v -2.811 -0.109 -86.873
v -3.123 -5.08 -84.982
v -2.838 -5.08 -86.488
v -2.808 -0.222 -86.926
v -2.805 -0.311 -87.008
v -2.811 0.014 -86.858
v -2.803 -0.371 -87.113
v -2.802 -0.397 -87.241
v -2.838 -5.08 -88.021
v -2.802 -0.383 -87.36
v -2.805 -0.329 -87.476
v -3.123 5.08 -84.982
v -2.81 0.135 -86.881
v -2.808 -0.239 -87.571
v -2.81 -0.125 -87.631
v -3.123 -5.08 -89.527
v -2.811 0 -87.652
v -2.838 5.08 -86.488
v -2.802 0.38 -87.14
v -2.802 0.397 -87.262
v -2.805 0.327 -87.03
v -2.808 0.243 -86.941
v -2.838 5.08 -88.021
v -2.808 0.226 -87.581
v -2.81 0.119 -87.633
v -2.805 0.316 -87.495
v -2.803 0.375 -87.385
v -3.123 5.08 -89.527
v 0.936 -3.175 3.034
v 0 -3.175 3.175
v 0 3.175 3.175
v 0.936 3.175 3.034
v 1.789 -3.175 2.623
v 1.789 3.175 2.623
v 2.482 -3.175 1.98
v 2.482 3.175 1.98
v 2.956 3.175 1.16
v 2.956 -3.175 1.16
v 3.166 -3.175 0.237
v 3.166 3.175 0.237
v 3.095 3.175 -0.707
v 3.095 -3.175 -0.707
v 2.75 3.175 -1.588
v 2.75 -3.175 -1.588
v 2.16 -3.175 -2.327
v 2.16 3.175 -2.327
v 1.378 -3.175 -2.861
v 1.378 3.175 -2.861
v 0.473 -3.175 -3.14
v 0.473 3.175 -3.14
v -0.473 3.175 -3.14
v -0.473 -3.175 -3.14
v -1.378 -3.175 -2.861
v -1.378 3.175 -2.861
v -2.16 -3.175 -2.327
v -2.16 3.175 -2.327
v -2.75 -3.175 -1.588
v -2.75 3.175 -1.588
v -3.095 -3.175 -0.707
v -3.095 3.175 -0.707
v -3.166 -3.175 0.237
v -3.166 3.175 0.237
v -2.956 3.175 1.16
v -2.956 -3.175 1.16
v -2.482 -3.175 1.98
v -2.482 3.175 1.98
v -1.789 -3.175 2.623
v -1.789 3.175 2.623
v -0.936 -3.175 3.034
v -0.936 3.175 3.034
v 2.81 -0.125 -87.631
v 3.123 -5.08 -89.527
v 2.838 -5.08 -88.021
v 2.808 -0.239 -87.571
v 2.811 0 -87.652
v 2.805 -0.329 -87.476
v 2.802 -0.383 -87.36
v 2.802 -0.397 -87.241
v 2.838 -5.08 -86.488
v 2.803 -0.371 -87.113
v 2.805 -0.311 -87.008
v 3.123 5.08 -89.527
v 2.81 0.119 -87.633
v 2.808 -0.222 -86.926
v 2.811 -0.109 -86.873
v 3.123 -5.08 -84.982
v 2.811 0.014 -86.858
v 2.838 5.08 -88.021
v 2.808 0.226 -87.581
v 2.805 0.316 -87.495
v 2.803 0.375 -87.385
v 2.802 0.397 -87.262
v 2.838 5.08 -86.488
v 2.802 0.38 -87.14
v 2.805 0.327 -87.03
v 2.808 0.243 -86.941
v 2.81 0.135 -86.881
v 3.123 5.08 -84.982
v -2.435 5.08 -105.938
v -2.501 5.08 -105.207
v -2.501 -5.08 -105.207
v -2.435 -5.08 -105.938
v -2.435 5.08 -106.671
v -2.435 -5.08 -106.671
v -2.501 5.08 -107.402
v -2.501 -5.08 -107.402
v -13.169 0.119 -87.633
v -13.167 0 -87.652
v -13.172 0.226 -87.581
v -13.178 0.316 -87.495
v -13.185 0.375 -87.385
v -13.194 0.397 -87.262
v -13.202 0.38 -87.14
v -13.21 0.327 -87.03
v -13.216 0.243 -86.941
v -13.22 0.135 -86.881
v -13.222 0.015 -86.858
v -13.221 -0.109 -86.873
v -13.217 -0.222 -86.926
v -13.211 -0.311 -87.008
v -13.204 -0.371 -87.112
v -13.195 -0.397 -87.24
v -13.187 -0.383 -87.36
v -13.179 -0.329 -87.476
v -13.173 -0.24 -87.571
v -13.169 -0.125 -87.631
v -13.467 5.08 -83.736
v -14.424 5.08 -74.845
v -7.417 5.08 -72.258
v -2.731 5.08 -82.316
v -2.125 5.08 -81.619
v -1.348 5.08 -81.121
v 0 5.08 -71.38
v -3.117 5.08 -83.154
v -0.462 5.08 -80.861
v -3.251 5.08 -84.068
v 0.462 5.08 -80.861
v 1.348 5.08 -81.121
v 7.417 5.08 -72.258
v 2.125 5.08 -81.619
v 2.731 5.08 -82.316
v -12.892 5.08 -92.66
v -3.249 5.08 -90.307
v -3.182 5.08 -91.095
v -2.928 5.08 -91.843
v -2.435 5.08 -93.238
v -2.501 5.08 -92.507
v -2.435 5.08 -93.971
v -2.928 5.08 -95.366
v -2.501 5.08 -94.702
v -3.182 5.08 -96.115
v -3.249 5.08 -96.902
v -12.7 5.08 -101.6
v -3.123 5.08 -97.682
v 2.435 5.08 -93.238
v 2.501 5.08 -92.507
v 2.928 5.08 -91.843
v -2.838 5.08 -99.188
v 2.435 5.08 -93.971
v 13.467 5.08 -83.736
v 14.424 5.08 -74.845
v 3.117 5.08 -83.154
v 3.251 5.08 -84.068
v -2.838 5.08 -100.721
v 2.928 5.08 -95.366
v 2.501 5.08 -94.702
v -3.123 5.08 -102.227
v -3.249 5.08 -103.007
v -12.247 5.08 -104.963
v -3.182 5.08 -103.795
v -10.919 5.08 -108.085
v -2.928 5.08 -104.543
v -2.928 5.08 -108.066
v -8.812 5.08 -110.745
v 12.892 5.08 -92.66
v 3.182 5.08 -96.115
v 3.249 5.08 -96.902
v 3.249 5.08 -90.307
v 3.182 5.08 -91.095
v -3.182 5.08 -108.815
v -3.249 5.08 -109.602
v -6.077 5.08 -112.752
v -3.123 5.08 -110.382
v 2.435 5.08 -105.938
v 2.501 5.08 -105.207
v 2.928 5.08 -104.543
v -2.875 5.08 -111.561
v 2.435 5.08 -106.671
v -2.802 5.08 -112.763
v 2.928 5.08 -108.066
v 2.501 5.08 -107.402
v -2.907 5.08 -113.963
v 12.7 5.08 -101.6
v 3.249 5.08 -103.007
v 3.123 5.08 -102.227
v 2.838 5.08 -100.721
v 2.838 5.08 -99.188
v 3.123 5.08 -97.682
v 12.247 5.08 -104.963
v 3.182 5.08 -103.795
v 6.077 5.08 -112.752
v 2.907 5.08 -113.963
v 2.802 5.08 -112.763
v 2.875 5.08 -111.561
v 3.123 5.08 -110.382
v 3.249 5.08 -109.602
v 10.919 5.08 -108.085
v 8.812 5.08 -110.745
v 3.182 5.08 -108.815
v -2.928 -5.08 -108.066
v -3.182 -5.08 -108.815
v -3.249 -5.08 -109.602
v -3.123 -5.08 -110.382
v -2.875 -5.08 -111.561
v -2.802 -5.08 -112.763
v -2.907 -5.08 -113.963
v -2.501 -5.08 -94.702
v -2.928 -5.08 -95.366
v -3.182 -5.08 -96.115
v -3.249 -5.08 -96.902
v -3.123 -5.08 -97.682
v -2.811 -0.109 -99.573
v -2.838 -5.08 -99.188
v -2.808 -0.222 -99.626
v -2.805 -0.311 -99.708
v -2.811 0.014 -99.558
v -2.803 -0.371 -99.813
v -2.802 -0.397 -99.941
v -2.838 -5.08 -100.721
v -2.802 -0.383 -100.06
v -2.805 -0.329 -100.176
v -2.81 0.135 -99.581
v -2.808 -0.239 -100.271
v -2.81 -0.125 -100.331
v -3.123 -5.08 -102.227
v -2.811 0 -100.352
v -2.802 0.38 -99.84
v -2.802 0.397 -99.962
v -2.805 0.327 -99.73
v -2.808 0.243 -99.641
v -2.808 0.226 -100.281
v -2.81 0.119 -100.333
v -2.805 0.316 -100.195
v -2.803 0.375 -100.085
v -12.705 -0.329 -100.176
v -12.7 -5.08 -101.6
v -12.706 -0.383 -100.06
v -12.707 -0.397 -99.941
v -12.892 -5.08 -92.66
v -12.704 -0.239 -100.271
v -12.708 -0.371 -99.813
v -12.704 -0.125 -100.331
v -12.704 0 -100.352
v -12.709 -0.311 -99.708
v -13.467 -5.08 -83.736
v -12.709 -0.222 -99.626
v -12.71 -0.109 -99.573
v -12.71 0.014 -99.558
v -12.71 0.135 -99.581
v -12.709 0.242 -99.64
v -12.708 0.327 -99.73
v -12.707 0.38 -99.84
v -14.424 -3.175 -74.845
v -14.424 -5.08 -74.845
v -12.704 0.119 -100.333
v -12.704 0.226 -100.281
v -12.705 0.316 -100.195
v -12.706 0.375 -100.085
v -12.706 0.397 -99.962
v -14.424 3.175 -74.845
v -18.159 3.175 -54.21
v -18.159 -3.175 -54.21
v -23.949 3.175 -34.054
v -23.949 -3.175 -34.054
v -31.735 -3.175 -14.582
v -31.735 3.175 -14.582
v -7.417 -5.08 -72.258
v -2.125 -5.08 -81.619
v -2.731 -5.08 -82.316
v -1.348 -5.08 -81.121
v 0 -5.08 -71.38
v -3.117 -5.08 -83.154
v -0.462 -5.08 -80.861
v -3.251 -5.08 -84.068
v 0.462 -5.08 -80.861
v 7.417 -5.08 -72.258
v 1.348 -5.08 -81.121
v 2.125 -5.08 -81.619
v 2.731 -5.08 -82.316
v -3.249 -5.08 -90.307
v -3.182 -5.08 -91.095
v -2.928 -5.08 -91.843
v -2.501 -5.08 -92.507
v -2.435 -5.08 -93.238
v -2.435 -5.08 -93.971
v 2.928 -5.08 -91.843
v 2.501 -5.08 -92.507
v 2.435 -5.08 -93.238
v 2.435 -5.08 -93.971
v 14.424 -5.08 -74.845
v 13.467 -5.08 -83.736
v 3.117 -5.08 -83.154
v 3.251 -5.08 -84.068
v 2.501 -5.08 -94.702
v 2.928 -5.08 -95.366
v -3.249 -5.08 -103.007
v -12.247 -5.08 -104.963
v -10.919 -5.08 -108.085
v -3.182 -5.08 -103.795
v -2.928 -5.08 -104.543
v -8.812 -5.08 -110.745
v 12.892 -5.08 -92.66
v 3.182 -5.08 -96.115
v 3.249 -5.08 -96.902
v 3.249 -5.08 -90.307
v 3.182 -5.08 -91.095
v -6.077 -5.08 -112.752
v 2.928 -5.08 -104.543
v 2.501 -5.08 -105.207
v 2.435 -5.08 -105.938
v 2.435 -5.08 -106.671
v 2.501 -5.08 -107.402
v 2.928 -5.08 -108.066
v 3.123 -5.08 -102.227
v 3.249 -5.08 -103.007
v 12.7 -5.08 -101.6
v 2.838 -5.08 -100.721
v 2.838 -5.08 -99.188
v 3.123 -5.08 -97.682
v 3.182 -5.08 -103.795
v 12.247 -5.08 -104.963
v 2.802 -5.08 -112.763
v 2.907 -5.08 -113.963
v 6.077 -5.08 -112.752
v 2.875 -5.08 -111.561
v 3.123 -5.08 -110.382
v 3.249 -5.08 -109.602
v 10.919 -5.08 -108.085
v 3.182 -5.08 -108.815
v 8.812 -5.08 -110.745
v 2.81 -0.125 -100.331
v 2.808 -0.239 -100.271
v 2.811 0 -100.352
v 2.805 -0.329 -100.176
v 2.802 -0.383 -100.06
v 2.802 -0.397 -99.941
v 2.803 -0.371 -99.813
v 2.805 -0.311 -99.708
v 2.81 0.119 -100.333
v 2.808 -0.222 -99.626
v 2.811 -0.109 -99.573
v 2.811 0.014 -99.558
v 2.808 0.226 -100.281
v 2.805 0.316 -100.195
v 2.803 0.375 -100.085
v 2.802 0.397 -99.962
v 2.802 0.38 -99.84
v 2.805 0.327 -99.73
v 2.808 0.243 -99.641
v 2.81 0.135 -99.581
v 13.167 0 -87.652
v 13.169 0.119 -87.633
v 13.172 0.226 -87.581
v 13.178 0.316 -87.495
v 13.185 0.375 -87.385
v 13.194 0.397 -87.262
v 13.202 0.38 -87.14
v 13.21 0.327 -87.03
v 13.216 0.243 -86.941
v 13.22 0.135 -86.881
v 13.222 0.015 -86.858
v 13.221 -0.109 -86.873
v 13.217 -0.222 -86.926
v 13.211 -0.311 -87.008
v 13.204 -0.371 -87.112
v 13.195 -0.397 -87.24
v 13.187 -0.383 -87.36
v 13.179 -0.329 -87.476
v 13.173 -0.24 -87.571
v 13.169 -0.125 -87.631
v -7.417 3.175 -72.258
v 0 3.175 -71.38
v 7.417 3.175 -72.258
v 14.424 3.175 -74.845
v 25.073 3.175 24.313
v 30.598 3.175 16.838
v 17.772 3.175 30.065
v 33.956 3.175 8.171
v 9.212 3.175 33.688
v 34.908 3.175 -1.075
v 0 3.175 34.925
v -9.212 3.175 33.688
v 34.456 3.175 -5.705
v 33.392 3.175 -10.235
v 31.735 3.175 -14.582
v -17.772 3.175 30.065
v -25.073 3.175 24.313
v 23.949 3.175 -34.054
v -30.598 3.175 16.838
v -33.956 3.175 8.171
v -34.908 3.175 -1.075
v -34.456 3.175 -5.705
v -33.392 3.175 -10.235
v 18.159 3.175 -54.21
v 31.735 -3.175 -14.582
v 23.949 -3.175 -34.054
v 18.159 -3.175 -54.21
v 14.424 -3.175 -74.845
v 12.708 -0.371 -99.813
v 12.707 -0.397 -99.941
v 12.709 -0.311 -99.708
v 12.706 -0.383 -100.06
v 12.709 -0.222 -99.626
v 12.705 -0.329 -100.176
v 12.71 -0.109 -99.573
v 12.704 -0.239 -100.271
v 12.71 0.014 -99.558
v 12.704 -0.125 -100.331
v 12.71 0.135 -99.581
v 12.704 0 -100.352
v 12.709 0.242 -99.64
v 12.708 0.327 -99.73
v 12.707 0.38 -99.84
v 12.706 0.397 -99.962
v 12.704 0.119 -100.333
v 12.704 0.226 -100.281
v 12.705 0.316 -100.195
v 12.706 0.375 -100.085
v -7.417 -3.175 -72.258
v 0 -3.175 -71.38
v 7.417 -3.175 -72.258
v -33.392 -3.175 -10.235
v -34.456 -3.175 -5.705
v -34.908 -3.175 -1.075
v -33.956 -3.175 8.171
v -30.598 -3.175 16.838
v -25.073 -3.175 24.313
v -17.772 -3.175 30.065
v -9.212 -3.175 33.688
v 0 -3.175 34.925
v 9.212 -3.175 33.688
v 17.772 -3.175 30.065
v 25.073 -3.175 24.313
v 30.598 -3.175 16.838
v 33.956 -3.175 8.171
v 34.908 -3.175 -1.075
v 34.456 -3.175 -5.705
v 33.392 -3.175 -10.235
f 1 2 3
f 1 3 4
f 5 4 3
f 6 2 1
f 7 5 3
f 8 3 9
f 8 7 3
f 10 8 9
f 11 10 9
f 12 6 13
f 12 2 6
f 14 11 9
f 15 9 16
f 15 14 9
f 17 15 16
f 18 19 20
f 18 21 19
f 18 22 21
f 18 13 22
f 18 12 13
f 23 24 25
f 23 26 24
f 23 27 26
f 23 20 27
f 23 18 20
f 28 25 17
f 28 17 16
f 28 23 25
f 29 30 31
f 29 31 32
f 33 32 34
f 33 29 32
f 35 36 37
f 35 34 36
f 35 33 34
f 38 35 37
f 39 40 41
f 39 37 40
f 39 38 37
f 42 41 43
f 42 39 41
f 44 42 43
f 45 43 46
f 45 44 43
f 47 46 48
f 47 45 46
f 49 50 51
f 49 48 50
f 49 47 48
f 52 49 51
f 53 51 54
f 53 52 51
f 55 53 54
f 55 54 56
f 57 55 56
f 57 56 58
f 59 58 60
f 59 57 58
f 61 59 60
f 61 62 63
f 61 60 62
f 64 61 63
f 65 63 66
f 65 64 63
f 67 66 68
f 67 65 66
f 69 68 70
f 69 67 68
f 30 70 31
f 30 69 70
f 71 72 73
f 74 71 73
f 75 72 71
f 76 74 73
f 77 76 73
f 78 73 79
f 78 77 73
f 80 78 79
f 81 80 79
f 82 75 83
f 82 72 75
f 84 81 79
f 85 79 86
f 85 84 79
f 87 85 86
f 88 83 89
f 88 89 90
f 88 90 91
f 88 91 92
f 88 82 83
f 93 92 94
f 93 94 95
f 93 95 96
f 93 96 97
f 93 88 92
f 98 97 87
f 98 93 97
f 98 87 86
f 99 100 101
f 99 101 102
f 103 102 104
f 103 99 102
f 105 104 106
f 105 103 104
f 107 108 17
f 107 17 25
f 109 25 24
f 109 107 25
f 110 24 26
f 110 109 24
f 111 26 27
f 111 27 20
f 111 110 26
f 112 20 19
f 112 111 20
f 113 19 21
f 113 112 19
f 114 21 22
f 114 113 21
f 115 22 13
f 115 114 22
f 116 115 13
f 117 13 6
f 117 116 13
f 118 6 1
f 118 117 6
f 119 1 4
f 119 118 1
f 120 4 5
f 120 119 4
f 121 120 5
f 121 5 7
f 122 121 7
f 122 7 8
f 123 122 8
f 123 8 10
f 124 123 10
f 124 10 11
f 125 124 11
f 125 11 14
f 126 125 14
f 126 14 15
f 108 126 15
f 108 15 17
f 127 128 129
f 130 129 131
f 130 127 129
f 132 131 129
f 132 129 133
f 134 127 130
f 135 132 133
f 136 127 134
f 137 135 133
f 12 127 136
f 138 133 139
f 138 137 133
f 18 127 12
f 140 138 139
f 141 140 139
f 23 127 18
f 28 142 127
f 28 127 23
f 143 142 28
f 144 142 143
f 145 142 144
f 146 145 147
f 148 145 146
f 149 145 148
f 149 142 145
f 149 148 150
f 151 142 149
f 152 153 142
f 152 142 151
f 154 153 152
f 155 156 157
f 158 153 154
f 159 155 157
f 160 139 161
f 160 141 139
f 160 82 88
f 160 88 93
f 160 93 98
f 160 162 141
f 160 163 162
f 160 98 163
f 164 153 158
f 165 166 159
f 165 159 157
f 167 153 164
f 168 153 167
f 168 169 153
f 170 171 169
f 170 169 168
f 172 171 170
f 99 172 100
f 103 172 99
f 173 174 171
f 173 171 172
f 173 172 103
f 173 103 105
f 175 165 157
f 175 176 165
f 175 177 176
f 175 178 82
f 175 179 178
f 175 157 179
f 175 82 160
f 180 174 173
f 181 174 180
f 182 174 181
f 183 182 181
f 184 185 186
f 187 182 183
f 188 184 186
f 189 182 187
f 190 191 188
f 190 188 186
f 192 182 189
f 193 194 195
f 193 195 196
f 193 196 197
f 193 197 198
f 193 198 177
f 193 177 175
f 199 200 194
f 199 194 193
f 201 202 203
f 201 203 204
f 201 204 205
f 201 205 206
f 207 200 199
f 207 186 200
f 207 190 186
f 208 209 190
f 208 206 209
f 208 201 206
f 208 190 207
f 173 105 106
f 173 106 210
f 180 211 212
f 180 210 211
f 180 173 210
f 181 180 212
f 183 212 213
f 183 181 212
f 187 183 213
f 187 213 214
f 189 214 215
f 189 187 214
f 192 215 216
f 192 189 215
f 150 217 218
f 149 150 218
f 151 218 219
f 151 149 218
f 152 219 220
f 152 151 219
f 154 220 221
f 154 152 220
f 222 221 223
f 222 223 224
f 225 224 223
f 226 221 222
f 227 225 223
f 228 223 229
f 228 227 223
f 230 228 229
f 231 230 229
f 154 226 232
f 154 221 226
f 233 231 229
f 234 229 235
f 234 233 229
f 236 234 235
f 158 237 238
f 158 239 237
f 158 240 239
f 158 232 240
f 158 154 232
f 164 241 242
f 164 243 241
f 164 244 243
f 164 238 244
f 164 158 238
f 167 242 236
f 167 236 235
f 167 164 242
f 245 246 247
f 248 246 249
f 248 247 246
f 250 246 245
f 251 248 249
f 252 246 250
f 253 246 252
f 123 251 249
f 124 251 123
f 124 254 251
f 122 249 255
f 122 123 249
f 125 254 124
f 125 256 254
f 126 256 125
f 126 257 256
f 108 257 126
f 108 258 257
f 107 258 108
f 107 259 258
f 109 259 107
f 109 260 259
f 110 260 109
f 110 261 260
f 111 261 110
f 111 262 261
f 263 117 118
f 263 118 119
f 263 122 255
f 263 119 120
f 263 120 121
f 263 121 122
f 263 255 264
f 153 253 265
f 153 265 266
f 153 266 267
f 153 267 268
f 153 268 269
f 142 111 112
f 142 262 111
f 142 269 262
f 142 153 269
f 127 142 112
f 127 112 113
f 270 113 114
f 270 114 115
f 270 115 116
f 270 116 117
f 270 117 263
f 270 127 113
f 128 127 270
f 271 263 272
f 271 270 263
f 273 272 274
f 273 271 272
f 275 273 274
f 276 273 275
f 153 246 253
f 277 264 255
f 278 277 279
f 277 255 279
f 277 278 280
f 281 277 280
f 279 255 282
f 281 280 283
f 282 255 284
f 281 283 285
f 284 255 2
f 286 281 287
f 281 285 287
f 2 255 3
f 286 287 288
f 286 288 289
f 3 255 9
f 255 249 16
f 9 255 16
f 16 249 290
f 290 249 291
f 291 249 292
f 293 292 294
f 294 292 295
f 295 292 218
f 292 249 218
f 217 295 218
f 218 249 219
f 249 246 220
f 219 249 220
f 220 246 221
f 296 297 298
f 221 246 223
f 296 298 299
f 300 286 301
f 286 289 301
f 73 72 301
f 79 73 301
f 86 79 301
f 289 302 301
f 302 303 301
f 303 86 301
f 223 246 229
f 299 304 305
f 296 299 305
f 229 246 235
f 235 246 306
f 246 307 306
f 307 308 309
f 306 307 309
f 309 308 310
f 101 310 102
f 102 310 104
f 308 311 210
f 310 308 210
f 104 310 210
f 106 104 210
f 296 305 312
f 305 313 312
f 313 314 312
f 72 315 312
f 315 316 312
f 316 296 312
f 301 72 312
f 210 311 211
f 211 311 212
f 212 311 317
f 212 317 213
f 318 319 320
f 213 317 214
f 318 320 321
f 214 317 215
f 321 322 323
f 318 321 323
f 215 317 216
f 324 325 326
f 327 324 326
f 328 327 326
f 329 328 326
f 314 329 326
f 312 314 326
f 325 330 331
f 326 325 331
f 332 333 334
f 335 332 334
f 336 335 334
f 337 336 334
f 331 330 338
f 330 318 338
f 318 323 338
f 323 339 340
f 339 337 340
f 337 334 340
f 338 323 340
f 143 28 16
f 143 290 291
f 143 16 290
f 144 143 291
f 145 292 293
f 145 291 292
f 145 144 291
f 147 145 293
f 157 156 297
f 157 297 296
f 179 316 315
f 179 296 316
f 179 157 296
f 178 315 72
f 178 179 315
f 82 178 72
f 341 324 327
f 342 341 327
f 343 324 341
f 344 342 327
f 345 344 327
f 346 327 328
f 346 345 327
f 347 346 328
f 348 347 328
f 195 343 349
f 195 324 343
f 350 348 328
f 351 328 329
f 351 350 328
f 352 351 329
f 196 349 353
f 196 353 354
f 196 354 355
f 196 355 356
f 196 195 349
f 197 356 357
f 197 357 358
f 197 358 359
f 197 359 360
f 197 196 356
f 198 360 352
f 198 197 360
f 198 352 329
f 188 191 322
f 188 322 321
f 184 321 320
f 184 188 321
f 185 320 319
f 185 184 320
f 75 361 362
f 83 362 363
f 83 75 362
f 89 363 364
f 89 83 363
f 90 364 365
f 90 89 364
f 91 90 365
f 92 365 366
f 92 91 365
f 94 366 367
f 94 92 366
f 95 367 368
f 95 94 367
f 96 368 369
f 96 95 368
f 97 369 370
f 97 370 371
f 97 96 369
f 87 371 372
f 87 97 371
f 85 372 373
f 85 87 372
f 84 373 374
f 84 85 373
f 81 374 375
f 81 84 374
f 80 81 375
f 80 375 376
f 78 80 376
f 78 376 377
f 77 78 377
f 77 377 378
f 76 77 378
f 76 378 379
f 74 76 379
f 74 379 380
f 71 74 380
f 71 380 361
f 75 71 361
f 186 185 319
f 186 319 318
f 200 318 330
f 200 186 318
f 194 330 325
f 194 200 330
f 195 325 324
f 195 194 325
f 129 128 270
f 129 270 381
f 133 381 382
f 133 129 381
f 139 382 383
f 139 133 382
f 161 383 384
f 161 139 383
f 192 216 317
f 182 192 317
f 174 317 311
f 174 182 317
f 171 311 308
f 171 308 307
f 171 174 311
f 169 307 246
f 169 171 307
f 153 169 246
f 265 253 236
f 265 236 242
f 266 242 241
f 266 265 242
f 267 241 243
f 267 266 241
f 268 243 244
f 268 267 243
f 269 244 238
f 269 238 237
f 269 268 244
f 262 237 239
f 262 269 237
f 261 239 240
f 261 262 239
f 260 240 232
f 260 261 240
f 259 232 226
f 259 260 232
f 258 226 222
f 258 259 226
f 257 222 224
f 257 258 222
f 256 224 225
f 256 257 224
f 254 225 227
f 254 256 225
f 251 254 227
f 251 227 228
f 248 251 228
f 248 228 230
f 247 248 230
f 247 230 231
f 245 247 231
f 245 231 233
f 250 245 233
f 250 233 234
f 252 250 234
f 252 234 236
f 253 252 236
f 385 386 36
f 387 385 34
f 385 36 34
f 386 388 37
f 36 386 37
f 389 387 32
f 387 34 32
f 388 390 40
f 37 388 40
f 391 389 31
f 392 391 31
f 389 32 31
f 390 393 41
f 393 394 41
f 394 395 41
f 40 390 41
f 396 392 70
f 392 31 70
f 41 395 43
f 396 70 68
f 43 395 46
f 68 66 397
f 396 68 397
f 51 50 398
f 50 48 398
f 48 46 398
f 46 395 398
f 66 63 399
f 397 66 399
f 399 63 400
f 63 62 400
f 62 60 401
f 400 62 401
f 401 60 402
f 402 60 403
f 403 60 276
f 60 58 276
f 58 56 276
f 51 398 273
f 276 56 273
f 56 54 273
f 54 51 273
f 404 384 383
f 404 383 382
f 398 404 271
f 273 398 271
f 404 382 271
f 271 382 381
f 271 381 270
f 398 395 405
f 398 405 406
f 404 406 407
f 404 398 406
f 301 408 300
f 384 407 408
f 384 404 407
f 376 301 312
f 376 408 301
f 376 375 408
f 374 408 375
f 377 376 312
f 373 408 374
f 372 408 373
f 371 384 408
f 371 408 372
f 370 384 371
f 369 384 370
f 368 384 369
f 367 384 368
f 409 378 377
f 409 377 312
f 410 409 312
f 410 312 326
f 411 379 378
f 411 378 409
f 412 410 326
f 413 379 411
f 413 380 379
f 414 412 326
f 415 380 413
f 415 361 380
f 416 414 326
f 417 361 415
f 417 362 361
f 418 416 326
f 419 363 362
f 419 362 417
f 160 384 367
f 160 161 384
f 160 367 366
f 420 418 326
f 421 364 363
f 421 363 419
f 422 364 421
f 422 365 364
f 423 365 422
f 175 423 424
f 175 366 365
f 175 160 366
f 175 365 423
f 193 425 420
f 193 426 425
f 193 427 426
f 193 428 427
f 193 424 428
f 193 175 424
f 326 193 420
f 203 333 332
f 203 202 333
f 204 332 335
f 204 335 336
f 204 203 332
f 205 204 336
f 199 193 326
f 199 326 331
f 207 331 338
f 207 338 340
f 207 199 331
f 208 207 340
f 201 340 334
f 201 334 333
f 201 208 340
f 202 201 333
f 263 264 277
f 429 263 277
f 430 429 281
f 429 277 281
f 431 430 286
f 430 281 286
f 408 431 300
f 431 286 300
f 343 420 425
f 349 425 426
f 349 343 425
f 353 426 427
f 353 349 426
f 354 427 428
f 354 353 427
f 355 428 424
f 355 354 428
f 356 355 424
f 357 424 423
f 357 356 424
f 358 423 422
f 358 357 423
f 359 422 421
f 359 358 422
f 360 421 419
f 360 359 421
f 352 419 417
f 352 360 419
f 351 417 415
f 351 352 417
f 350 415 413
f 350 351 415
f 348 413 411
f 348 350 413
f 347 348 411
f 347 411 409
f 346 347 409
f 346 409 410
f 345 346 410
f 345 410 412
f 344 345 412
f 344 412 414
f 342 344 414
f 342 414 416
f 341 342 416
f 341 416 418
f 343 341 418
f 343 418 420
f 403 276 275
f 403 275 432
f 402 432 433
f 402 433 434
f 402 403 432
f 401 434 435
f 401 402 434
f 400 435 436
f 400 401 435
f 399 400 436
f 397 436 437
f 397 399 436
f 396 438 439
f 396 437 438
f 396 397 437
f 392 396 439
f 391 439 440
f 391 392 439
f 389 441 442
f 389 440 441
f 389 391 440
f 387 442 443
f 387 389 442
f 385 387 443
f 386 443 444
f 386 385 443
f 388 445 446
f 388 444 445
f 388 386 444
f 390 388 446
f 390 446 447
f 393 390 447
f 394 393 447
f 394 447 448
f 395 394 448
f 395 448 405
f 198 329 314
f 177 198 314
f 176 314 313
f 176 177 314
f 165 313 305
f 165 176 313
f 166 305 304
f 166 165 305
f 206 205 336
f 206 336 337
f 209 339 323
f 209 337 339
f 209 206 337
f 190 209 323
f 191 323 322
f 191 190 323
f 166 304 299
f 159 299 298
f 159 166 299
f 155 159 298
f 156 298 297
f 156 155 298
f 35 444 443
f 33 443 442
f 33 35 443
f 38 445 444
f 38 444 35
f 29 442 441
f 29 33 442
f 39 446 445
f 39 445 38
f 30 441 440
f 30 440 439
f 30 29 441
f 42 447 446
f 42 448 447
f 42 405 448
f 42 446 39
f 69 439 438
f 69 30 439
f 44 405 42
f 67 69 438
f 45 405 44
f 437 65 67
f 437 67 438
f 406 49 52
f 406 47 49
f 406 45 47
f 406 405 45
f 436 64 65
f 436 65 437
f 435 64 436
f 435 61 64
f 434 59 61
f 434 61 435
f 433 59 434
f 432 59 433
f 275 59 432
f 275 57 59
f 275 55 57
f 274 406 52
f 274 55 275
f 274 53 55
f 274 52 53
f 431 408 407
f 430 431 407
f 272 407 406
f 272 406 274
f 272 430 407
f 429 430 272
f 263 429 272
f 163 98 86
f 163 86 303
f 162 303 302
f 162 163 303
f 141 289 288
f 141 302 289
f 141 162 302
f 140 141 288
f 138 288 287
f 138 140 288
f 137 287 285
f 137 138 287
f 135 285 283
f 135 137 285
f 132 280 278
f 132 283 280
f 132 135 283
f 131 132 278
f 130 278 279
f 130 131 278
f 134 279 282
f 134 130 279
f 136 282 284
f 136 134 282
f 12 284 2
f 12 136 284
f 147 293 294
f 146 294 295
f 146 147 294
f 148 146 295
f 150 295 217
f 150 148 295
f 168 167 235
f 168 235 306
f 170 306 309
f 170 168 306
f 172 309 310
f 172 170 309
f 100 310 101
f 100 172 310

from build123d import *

# Parameters (mm, degrees)
SKETCH1_R               = 3.175
BOSS_EXTRUDE1_DEPTH     = 5.08
CUT_EXTRUDE2_DEPTH      = 5.715
CUT_EXTRUDE3_DEPTH      = 120.302535254
CUT_EXTRUDE3_DEPTH_BACK = 120.302535254
SKETCH4_R               = 0.396875
CUT_EXTRUDE8_DEPTH      = 1.905


with BuildPart() as part:
    # Sketch1 → Boss-Extrude1 (new, symmetric)
    with BuildSketch(Plane(origin=(0, 0, 0), x_dir=(1, 0, 0), z_dir=(0, 1, 0))):
        with BuildLine():
            ThreePointArc((-12.7, 101.6), (-17.514407624, 57.062136043), (-31.735205033, 14.581919851))
            ThreePointArc((-31.735205033, 14.581919851), (0, -34.925), (31.735205033, 14.581919851))
            ThreePointArc((31.735205033, 14.581919851), (17.514407624, 57.062136043), (12.7, 101.6))
            ThreePointArc((12.7, 101.6), (0, 114.3), (-12.7, 101.6))
        make_face()
        with Locations(Location((0, 0, 0), (0, 0, 270))):
            Circle(SKETCH1_R, mode=Mode.SUBTRACT)
    extrude(amount=BOSS_EXTRUDE1_DEPTH, both=True)

    # Sketch2 → Cut-Extrude2 (cut, symmetric)
    with BuildSketch(Plane(origin=(0, 0, 0), x_dir=(1, 0, 0), z_dir=(0, 1, 0))):
        with BuildLine():
            ThreePointArc((-2.500603456, 105.207450456), (-2.42672892, 106.304643007), (-2.500603456, 107.401835557))
            ThreePointArc((-2.500603456, 107.401835557), (-3.18246494, 108.814648011), (-3.123385981, 110.382284382))
            ThreePointArc((-3.123385981, 110.382284382), (-2.80162, 112.654643007), (-3.123385981, 114.927001632))
            ThreePointArc((-3.123385981, 114.927001632), (-3.18246494, 116.494638003), (-2.500603456, 117.907450456))
            ThreePointArc((-2.500603456, 117.907450456), (-2.42672892, 119.004643007), (-2.500603456, 120.101835557))
            ThreePointArc((-2.500603456, 120.101835557), (-3.18246494, 121.514648011), (-3.123385981, 123.082284382))
            ThreePointArc((-3.123385981, 123.082284382), (-2.80162, 125.354643007), (-3.123385981, 127.627001632))
            ThreePointArc((-3.123385981, 127.627001632), (-3.18246494, 129.194638003), (-2.500603456, 130.607450456))
            ThreePointArc((-2.500603456, 130.607450456), (-2.451700025, 132.343502027), (-2.77019509, 134.050788615))
            ThreePointArc((-2.77019509, 134.050788615), (0, 137.771179007), (2.77019509, 134.050788615))
            ThreePointArc((2.77019509, 134.050788615), (2.451700025, 132.343502027), (2.500603456, 130.607450456))
            ThreePointArc((2.500603456, 130.607450456), (3.18246494, 129.194638003), (3.123385981, 127.627001632))
            ThreePointArc((3.123385981, 127.627001632), (2.80162, 125.354643007), (3.123385981, 123.082284382))
            ThreePointArc((3.123385981, 123.082284382), (3.18246494, 121.514648011), (2.500603456, 120.101835557))
            ThreePointArc((2.500603456, 120.101835557), (2.42672892, 119.004643007), (2.500603456, 117.907450456))
            ThreePointArc((2.500603456, 117.907450456), (3.18246494, 116.494638003), (3.123385981, 114.927001632))
            ThreePointArc((3.123385981, 114.927001632), (2.80162, 112.654643007), (3.123385981, 110.382284382))
            ThreePointArc((3.123385981, 110.382284382), (3.18246494, 108.814648011), (2.500603456, 107.401835557))
            ThreePointArc((2.500603456, 107.401835557), (2.42672892, 106.304643007), (2.500603456, 105.207450456))
            ThreePointArc((2.500603456, 105.207450456), (3.18246494, 103.794638003), (3.123385981, 102.227001632))
            ThreePointArc((3.123385981, 102.227001632), (2.80162, 99.954643007), (3.123385981, 97.682284382))
            ThreePointArc((3.123385981, 97.682284382), (3.18246494, 96.114648011), (2.500603456, 94.701835557))
            ThreePointArc((2.500603456, 94.701835557), (2.42672892, 93.604643007), (2.500603456, 92.507450456))
            ThreePointArc((2.500603456, 92.507450456), (3.18246494, 91.094638003), (3.123385981, 89.527001632))
            ThreePointArc((3.123385981, 89.527001632), (2.80162, 87.254643007), (3.123385981, 84.982284382))
            ThreePointArc((3.123385981, 84.982284382), (0, 80.828443007), (-3.123385981, 84.982284382))
            ThreePointArc((-3.123385981, 84.982284382), (-2.80162, 87.254643007), (-3.123385981, 89.527001632))
            ThreePointArc((-3.123385981, 89.527001632), (-3.18246494, 91.094638003), (-2.500603456, 92.507450456))
            ThreePointArc((-2.500603456, 92.507450456), (-2.42672892, 93.604643007), (-2.500603456, 94.701835557))
            ThreePointArc((-2.500603456, 94.701835557), (-3.18246494, 96.114648011), (-3.123385981, 97.682284382))
            ThreePointArc((-3.123385981, 97.682284382), (-2.80162, 99.954643007), (-3.123385981, 102.227001632))
            ThreePointArc((-3.123385981, 102.227001632), (-3.18246494, 103.794638003), (-2.500603456, 105.207450456))
        make_face()
    extrude(amount=CUT_EXTRUDE2_DEPTH, both=True, mode=Mode.SUBTRACT)

    # Sketch4 → Cut-Extrude3 (cut, two sides: drawn at the far end of the back side and taken through both)
    with BuildSketch(Plane(origin=(0, 0, 0), x_dir=(0, 0, -1), z_dir=(1, 0, 0)).offset(-CUT_EXTRUDE3_DEPTH_BACK)):
        with Locations((87.254643007, 0)):
            Circle(SKETCH4_R)
        with Locations((99.954643007, 0)):
            Circle(SKETCH4_R)
    extrude(amount=CUT_EXTRUDE3_DEPTH + CUT_EXTRUDE3_DEPTH_BACK, mode=Mode.SUBTRACT)

    # Sketch11 → Cut-Extrude8 (cut)
    with BuildSketch(Plane(origin=(0, 5.08, 0), x_dir=(1, 0, 0), z_dir=(0, 1, 0))):
        with BuildLine():
            Line((-34.908444977, 1.075218257), (-31.734949979, 104.107114149))
            ThreePointArc((-31.734949979, 104.107114149), (0, 71.379643007), (31.734949979, 104.107114149))
            Line((31.734949979, 104.107114149), (34.908444977, 1.075218257))
            ThreePointArc((34.908444977, 1.075218257), (0, -34.925), (-34.908444977, 1.075218257))
        make_face()
    cut_extrude8 = extrude(amount=-CUT_EXTRUDE8_DEPTH, mode=Mode.SUBTRACT)

    # Mirror1: Cut-Extrude8 across plane
    add(cut_extrude8.mirror(Plane.ZX), mode=Mode.SUBTRACT)


solid = part.part
